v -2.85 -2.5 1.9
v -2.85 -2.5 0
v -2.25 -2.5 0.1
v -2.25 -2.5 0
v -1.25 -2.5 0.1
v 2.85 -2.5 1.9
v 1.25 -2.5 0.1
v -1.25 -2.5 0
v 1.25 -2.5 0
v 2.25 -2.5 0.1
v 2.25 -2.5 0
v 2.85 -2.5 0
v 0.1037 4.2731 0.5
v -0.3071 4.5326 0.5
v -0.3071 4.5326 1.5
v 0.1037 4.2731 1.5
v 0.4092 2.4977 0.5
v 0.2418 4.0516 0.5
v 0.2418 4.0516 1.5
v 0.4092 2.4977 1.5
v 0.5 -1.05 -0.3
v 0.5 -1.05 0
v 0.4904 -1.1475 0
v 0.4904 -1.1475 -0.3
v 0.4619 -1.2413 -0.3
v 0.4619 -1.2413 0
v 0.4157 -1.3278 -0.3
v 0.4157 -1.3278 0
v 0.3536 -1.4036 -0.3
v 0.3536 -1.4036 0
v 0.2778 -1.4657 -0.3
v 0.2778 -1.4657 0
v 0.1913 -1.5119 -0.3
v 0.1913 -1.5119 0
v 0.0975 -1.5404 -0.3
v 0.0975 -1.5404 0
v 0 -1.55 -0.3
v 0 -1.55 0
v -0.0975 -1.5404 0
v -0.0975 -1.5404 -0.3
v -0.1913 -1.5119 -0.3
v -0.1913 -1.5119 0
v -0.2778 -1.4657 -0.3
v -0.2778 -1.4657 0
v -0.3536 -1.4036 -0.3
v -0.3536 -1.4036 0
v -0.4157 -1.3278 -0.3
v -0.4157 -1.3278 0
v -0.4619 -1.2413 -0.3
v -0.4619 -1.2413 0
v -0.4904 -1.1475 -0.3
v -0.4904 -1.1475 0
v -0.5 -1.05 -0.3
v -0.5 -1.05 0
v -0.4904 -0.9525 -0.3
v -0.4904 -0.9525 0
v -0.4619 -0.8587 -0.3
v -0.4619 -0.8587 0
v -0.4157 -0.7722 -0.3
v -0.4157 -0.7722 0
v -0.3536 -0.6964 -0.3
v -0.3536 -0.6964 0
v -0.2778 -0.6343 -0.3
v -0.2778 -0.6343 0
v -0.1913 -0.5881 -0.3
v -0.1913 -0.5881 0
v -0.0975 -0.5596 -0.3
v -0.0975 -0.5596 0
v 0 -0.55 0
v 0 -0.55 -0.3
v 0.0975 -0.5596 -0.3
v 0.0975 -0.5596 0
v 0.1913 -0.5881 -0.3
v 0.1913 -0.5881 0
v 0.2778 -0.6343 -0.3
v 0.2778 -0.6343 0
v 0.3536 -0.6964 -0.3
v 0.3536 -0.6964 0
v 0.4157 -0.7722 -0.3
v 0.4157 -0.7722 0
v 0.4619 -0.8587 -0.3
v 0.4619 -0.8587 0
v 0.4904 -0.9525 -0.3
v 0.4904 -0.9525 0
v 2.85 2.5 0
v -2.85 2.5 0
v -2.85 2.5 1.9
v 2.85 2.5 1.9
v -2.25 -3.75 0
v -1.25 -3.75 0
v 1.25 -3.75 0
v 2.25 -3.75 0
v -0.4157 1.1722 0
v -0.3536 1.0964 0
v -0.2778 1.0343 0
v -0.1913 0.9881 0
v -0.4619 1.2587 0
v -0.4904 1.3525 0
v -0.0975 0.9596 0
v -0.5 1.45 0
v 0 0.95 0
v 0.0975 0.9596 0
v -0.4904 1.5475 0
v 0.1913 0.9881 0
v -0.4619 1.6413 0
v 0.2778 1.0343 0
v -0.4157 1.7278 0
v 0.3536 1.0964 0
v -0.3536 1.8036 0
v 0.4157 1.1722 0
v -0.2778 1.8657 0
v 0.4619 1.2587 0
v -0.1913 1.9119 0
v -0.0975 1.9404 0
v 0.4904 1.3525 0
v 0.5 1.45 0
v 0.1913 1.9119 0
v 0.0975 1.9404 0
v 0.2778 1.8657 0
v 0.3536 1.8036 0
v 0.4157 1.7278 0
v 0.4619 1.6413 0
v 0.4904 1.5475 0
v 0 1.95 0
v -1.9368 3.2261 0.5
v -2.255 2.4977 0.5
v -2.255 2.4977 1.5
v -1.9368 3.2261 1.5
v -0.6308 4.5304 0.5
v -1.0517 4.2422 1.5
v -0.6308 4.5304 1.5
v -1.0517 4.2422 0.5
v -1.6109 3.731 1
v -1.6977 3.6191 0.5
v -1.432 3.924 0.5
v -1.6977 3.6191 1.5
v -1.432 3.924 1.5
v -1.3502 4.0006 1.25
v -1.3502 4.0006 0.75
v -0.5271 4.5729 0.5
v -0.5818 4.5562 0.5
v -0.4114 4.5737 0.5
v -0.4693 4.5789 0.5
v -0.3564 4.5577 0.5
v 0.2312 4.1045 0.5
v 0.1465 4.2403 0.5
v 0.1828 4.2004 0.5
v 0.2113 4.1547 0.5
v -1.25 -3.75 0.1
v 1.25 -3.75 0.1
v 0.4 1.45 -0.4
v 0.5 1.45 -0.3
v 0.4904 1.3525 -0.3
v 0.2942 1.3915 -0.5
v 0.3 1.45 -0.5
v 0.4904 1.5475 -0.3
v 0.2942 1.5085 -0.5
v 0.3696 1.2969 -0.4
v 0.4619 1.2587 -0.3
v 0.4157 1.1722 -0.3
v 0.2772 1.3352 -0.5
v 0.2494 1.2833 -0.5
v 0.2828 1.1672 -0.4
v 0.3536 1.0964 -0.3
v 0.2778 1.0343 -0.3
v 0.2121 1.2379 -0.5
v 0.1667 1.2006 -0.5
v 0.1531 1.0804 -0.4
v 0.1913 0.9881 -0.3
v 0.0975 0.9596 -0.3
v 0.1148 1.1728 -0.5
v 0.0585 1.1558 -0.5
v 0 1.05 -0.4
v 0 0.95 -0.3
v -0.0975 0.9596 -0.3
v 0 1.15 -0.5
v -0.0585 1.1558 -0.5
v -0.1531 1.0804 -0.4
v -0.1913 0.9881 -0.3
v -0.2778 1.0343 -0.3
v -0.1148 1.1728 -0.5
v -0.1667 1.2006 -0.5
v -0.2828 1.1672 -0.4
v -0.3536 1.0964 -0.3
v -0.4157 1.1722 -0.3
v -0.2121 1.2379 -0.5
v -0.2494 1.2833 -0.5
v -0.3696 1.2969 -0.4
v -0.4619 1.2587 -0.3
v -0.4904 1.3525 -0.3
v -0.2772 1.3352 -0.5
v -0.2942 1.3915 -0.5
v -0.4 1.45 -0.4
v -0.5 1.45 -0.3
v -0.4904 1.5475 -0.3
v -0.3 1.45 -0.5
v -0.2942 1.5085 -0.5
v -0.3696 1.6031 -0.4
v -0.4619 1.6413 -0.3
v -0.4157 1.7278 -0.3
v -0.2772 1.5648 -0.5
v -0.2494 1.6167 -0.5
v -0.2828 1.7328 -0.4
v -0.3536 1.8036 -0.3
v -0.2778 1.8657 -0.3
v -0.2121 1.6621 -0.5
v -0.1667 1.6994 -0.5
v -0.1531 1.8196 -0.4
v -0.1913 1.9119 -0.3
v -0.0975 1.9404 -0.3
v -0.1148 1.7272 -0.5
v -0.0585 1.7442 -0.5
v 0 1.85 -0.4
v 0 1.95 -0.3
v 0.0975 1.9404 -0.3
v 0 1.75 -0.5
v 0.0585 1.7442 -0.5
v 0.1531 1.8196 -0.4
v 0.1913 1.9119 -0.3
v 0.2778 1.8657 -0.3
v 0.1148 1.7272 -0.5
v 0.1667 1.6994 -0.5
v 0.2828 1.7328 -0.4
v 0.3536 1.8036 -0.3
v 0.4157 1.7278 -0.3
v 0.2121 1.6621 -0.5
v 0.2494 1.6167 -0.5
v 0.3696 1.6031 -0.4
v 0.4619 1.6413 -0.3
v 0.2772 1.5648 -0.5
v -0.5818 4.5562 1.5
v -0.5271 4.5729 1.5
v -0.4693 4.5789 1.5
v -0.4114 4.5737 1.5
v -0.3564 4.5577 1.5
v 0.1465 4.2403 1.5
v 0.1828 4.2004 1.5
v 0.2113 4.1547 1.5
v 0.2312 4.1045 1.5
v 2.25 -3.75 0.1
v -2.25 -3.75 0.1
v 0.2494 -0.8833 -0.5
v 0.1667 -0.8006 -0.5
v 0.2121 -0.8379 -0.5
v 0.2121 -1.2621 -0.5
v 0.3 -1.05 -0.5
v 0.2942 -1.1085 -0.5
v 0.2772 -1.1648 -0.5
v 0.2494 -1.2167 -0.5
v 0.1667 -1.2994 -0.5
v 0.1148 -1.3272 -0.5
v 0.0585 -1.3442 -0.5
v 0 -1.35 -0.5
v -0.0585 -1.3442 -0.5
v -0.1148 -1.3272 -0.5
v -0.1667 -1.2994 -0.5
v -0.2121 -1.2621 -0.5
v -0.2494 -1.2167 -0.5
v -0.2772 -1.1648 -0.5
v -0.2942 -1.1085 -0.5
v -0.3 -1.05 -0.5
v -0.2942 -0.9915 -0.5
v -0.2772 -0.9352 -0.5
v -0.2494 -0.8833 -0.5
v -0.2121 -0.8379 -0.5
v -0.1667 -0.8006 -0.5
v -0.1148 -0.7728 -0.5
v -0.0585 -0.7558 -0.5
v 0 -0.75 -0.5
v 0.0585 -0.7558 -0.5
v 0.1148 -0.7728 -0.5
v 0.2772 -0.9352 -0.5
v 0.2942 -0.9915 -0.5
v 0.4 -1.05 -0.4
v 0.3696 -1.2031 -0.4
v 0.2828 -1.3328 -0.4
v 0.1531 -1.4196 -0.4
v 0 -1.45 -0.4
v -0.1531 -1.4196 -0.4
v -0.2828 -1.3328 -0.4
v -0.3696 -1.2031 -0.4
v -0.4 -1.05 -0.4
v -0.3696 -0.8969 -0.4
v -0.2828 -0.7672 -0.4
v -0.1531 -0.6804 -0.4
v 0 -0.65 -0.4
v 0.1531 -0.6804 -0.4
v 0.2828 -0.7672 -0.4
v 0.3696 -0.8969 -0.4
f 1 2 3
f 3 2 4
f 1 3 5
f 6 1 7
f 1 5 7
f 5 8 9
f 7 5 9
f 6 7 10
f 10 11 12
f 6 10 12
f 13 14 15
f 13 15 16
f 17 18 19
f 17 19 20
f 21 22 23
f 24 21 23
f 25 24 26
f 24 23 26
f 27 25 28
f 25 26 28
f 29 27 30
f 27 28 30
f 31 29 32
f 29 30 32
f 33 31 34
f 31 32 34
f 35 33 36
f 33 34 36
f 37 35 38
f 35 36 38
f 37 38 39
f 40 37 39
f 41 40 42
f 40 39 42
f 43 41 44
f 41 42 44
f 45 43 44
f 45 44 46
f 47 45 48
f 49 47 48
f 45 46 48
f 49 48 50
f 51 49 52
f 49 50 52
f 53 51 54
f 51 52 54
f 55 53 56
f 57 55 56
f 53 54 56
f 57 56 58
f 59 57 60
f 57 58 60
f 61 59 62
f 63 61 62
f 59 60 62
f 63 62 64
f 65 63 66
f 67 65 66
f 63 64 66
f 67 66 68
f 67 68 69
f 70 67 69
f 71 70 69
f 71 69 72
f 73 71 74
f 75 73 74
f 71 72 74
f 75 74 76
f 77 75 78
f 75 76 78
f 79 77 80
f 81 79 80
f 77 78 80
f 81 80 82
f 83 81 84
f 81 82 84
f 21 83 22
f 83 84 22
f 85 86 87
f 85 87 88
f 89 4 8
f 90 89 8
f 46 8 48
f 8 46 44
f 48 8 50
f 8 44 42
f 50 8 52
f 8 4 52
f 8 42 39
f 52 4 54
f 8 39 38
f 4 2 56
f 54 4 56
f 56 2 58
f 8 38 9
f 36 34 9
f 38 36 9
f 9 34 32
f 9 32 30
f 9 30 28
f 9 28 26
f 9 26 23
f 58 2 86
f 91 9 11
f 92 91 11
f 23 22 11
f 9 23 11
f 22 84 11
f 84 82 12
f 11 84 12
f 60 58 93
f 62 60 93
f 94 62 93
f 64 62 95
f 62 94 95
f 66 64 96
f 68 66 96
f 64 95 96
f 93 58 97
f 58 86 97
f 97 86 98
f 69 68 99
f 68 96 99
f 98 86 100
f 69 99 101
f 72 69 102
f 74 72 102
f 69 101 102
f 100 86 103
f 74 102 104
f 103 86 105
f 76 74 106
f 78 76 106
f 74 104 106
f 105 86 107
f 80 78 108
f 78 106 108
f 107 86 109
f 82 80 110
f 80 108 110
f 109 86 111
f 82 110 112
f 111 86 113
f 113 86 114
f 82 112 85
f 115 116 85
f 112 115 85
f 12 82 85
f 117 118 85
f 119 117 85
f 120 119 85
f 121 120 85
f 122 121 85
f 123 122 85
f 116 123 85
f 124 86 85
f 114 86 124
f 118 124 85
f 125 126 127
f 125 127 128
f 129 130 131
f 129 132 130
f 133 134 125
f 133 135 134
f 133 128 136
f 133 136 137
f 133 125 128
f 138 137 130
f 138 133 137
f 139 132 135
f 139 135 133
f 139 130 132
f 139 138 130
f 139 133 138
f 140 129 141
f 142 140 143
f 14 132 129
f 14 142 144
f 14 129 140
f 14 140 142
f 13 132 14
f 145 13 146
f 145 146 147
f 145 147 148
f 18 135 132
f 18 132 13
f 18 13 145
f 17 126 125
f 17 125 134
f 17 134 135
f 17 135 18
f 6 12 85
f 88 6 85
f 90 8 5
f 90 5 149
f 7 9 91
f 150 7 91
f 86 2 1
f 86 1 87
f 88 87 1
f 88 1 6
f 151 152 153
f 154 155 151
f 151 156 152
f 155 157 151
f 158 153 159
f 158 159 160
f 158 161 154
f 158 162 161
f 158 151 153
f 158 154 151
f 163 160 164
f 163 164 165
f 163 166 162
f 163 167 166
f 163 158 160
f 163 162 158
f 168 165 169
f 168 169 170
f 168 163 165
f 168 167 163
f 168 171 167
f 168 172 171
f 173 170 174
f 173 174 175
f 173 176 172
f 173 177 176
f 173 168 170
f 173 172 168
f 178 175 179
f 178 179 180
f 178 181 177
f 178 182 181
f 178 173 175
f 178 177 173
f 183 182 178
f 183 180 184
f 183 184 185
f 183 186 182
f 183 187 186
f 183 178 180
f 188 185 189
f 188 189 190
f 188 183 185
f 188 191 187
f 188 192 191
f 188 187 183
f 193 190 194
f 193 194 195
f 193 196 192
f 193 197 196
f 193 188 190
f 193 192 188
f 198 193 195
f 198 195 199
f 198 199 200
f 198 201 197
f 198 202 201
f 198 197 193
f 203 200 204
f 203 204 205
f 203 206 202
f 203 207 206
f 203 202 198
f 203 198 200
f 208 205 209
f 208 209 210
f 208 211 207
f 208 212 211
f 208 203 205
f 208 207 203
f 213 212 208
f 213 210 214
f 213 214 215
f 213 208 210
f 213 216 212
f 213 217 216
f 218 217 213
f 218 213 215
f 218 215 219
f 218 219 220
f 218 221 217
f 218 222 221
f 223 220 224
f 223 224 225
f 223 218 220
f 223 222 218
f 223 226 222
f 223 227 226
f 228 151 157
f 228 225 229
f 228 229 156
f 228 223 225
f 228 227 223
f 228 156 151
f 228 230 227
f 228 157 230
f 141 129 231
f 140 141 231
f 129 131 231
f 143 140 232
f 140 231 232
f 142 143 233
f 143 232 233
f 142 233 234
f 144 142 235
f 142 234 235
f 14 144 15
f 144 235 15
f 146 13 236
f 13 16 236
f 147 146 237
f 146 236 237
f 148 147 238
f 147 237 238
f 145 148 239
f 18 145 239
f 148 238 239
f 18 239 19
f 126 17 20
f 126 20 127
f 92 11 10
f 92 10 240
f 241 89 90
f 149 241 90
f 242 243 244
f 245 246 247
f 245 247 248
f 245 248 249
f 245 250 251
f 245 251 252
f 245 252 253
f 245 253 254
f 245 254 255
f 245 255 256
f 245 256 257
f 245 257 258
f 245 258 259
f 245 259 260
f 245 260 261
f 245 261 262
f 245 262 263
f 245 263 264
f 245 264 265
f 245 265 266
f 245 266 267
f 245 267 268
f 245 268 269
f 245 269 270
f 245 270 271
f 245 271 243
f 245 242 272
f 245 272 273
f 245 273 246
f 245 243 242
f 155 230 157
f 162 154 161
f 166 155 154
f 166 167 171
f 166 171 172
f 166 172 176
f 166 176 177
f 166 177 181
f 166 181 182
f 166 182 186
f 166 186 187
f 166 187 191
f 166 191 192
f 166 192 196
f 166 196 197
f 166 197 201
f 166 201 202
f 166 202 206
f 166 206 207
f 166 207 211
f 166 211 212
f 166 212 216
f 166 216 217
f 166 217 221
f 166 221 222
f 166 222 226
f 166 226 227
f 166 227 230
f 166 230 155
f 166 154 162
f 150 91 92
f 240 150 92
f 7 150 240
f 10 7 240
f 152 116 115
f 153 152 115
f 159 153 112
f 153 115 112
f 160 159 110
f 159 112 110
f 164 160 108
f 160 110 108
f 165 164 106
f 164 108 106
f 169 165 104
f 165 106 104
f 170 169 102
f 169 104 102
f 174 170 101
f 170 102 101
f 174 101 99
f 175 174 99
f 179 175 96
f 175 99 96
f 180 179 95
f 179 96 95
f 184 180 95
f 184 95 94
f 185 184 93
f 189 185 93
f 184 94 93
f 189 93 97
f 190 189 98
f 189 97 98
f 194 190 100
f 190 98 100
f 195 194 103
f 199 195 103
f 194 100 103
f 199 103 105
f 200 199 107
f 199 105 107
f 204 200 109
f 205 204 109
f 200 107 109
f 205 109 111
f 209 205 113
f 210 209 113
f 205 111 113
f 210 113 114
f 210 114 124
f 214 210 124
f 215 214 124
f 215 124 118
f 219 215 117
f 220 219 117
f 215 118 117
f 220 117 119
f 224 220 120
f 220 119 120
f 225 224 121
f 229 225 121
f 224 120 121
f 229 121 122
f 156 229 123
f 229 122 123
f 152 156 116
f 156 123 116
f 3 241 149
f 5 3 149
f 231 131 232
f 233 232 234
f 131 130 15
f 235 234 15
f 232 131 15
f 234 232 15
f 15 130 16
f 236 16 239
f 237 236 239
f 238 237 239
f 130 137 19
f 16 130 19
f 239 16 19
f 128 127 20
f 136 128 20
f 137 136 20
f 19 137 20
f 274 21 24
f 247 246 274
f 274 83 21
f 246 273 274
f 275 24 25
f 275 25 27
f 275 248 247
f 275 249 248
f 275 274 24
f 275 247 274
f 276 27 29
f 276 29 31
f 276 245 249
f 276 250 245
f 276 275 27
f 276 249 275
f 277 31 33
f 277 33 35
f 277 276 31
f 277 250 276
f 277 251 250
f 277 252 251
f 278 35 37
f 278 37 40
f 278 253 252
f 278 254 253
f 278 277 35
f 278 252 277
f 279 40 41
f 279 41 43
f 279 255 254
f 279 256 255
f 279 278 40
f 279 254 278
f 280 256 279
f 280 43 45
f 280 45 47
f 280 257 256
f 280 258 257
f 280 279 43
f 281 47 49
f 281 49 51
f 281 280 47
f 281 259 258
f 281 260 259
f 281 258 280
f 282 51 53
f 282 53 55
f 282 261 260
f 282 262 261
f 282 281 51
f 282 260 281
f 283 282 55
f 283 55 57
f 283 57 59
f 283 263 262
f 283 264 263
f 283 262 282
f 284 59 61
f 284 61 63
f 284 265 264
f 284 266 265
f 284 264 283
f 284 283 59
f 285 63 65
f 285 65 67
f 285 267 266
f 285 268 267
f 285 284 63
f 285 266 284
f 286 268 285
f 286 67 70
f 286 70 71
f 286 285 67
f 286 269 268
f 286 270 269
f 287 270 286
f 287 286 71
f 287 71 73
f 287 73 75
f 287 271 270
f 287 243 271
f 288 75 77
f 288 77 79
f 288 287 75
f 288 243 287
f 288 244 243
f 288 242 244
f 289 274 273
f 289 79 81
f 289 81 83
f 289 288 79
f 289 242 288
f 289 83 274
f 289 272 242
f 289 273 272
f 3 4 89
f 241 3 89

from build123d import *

# Parameters (mm, degrees)
F0_W      = 5.7
F0_H      = 5
F1_DEPTH  = 1.9
F4_DEPTH  = 1
F5_R      = 0.3
F6_R      = 0.5
F7_DEPTH  = 0.5
F8_SIZE   = 0.2
F9_W      = 1
F9_H      = 1.25
F10_DEPTH = 0.1


with BuildPart() as f1:
    # F0 (on Top) → F1 (new body)
    with BuildSketch(Plane.XY):
        Rectangle(F0_W, F0_H)
    extrude(amount=F1_DEPTH)

    # F6 (on face) → F7 (join)
    with BuildSketch(Plane(origin=(0, 0, 0), x_dir=(1, 0, 0), z_dir=(0, 0, -1))):
        with Locations((0, -1.45)):
            Circle(F6_R)
        with Locations((0, 1.05)):
            Circle(F6_R)
    extrude(amount=F7_DEPTH)

    # F8
    f8_edges = [f1.edges().sort_by_distance(p)[0] for p in [
        (-0.5, 1.45, -0.5),
        (-0.5, -1.05, -0.5),
    ]]
    chamfer(f8_edges, length=F8_SIZE)

    # F9 (on face) → F10 (join)
    with BuildSketch(Plane(origin=(0, 0, 0), x_dir=(1, 0, 0), z_dir=(0, 0, -1))):
        with Locations((1.75, 3.125)):
            Rectangle(F9_W, F9_H)
        with Locations((-1.75, 3.125)):
            Rectangle(F9_W, F9_H)
    extrude(amount=-F10_DEPTH)


with BuildPart() as f4:
    # F3 (on offset) → F4 (new body)
    with BuildSketch(Plane(origin=(0, 0, 0.5), x_dir=(1, 0, 0), z_dir=(0, 0, -1))):
        with BuildLine():
            add(Edge.make_bspline(
                [(-2.2549992427, -2.4976590648), (-2.0791823504, -2.9375716365), (-1.7234922822, -3.8275460328), (-0.8903959784, -4.3637341728), (-0.4690975184, -4.6348855831)],
                knots=[0, 0, 0, 0, 0.4942980084, 1, 1, 1, 1], degree=3))
            Line((-0.4690975184, -4.6348855831), (0.2262331254, -4.1957297362))
            Line((0.2262331254, -4.1957297362), (0.4092148738, -2.4976590648))
            Line((0.4092148738, -2.4976590648), (-2.2549992427, -2.4976590648))
        make_face()
    extrude(amount=-F4_DEPTH)

    # F5
    f5_edges = [f4.edges().sort_by_distance(p)[0] for p in [
        (-0.469098, 4.634886, 1),
        (0.226233, 4.19573, 1),
    ]]
    fillet(f5_edges, radius=F5_R)


solid = Compound([f1.part, f4.part])
